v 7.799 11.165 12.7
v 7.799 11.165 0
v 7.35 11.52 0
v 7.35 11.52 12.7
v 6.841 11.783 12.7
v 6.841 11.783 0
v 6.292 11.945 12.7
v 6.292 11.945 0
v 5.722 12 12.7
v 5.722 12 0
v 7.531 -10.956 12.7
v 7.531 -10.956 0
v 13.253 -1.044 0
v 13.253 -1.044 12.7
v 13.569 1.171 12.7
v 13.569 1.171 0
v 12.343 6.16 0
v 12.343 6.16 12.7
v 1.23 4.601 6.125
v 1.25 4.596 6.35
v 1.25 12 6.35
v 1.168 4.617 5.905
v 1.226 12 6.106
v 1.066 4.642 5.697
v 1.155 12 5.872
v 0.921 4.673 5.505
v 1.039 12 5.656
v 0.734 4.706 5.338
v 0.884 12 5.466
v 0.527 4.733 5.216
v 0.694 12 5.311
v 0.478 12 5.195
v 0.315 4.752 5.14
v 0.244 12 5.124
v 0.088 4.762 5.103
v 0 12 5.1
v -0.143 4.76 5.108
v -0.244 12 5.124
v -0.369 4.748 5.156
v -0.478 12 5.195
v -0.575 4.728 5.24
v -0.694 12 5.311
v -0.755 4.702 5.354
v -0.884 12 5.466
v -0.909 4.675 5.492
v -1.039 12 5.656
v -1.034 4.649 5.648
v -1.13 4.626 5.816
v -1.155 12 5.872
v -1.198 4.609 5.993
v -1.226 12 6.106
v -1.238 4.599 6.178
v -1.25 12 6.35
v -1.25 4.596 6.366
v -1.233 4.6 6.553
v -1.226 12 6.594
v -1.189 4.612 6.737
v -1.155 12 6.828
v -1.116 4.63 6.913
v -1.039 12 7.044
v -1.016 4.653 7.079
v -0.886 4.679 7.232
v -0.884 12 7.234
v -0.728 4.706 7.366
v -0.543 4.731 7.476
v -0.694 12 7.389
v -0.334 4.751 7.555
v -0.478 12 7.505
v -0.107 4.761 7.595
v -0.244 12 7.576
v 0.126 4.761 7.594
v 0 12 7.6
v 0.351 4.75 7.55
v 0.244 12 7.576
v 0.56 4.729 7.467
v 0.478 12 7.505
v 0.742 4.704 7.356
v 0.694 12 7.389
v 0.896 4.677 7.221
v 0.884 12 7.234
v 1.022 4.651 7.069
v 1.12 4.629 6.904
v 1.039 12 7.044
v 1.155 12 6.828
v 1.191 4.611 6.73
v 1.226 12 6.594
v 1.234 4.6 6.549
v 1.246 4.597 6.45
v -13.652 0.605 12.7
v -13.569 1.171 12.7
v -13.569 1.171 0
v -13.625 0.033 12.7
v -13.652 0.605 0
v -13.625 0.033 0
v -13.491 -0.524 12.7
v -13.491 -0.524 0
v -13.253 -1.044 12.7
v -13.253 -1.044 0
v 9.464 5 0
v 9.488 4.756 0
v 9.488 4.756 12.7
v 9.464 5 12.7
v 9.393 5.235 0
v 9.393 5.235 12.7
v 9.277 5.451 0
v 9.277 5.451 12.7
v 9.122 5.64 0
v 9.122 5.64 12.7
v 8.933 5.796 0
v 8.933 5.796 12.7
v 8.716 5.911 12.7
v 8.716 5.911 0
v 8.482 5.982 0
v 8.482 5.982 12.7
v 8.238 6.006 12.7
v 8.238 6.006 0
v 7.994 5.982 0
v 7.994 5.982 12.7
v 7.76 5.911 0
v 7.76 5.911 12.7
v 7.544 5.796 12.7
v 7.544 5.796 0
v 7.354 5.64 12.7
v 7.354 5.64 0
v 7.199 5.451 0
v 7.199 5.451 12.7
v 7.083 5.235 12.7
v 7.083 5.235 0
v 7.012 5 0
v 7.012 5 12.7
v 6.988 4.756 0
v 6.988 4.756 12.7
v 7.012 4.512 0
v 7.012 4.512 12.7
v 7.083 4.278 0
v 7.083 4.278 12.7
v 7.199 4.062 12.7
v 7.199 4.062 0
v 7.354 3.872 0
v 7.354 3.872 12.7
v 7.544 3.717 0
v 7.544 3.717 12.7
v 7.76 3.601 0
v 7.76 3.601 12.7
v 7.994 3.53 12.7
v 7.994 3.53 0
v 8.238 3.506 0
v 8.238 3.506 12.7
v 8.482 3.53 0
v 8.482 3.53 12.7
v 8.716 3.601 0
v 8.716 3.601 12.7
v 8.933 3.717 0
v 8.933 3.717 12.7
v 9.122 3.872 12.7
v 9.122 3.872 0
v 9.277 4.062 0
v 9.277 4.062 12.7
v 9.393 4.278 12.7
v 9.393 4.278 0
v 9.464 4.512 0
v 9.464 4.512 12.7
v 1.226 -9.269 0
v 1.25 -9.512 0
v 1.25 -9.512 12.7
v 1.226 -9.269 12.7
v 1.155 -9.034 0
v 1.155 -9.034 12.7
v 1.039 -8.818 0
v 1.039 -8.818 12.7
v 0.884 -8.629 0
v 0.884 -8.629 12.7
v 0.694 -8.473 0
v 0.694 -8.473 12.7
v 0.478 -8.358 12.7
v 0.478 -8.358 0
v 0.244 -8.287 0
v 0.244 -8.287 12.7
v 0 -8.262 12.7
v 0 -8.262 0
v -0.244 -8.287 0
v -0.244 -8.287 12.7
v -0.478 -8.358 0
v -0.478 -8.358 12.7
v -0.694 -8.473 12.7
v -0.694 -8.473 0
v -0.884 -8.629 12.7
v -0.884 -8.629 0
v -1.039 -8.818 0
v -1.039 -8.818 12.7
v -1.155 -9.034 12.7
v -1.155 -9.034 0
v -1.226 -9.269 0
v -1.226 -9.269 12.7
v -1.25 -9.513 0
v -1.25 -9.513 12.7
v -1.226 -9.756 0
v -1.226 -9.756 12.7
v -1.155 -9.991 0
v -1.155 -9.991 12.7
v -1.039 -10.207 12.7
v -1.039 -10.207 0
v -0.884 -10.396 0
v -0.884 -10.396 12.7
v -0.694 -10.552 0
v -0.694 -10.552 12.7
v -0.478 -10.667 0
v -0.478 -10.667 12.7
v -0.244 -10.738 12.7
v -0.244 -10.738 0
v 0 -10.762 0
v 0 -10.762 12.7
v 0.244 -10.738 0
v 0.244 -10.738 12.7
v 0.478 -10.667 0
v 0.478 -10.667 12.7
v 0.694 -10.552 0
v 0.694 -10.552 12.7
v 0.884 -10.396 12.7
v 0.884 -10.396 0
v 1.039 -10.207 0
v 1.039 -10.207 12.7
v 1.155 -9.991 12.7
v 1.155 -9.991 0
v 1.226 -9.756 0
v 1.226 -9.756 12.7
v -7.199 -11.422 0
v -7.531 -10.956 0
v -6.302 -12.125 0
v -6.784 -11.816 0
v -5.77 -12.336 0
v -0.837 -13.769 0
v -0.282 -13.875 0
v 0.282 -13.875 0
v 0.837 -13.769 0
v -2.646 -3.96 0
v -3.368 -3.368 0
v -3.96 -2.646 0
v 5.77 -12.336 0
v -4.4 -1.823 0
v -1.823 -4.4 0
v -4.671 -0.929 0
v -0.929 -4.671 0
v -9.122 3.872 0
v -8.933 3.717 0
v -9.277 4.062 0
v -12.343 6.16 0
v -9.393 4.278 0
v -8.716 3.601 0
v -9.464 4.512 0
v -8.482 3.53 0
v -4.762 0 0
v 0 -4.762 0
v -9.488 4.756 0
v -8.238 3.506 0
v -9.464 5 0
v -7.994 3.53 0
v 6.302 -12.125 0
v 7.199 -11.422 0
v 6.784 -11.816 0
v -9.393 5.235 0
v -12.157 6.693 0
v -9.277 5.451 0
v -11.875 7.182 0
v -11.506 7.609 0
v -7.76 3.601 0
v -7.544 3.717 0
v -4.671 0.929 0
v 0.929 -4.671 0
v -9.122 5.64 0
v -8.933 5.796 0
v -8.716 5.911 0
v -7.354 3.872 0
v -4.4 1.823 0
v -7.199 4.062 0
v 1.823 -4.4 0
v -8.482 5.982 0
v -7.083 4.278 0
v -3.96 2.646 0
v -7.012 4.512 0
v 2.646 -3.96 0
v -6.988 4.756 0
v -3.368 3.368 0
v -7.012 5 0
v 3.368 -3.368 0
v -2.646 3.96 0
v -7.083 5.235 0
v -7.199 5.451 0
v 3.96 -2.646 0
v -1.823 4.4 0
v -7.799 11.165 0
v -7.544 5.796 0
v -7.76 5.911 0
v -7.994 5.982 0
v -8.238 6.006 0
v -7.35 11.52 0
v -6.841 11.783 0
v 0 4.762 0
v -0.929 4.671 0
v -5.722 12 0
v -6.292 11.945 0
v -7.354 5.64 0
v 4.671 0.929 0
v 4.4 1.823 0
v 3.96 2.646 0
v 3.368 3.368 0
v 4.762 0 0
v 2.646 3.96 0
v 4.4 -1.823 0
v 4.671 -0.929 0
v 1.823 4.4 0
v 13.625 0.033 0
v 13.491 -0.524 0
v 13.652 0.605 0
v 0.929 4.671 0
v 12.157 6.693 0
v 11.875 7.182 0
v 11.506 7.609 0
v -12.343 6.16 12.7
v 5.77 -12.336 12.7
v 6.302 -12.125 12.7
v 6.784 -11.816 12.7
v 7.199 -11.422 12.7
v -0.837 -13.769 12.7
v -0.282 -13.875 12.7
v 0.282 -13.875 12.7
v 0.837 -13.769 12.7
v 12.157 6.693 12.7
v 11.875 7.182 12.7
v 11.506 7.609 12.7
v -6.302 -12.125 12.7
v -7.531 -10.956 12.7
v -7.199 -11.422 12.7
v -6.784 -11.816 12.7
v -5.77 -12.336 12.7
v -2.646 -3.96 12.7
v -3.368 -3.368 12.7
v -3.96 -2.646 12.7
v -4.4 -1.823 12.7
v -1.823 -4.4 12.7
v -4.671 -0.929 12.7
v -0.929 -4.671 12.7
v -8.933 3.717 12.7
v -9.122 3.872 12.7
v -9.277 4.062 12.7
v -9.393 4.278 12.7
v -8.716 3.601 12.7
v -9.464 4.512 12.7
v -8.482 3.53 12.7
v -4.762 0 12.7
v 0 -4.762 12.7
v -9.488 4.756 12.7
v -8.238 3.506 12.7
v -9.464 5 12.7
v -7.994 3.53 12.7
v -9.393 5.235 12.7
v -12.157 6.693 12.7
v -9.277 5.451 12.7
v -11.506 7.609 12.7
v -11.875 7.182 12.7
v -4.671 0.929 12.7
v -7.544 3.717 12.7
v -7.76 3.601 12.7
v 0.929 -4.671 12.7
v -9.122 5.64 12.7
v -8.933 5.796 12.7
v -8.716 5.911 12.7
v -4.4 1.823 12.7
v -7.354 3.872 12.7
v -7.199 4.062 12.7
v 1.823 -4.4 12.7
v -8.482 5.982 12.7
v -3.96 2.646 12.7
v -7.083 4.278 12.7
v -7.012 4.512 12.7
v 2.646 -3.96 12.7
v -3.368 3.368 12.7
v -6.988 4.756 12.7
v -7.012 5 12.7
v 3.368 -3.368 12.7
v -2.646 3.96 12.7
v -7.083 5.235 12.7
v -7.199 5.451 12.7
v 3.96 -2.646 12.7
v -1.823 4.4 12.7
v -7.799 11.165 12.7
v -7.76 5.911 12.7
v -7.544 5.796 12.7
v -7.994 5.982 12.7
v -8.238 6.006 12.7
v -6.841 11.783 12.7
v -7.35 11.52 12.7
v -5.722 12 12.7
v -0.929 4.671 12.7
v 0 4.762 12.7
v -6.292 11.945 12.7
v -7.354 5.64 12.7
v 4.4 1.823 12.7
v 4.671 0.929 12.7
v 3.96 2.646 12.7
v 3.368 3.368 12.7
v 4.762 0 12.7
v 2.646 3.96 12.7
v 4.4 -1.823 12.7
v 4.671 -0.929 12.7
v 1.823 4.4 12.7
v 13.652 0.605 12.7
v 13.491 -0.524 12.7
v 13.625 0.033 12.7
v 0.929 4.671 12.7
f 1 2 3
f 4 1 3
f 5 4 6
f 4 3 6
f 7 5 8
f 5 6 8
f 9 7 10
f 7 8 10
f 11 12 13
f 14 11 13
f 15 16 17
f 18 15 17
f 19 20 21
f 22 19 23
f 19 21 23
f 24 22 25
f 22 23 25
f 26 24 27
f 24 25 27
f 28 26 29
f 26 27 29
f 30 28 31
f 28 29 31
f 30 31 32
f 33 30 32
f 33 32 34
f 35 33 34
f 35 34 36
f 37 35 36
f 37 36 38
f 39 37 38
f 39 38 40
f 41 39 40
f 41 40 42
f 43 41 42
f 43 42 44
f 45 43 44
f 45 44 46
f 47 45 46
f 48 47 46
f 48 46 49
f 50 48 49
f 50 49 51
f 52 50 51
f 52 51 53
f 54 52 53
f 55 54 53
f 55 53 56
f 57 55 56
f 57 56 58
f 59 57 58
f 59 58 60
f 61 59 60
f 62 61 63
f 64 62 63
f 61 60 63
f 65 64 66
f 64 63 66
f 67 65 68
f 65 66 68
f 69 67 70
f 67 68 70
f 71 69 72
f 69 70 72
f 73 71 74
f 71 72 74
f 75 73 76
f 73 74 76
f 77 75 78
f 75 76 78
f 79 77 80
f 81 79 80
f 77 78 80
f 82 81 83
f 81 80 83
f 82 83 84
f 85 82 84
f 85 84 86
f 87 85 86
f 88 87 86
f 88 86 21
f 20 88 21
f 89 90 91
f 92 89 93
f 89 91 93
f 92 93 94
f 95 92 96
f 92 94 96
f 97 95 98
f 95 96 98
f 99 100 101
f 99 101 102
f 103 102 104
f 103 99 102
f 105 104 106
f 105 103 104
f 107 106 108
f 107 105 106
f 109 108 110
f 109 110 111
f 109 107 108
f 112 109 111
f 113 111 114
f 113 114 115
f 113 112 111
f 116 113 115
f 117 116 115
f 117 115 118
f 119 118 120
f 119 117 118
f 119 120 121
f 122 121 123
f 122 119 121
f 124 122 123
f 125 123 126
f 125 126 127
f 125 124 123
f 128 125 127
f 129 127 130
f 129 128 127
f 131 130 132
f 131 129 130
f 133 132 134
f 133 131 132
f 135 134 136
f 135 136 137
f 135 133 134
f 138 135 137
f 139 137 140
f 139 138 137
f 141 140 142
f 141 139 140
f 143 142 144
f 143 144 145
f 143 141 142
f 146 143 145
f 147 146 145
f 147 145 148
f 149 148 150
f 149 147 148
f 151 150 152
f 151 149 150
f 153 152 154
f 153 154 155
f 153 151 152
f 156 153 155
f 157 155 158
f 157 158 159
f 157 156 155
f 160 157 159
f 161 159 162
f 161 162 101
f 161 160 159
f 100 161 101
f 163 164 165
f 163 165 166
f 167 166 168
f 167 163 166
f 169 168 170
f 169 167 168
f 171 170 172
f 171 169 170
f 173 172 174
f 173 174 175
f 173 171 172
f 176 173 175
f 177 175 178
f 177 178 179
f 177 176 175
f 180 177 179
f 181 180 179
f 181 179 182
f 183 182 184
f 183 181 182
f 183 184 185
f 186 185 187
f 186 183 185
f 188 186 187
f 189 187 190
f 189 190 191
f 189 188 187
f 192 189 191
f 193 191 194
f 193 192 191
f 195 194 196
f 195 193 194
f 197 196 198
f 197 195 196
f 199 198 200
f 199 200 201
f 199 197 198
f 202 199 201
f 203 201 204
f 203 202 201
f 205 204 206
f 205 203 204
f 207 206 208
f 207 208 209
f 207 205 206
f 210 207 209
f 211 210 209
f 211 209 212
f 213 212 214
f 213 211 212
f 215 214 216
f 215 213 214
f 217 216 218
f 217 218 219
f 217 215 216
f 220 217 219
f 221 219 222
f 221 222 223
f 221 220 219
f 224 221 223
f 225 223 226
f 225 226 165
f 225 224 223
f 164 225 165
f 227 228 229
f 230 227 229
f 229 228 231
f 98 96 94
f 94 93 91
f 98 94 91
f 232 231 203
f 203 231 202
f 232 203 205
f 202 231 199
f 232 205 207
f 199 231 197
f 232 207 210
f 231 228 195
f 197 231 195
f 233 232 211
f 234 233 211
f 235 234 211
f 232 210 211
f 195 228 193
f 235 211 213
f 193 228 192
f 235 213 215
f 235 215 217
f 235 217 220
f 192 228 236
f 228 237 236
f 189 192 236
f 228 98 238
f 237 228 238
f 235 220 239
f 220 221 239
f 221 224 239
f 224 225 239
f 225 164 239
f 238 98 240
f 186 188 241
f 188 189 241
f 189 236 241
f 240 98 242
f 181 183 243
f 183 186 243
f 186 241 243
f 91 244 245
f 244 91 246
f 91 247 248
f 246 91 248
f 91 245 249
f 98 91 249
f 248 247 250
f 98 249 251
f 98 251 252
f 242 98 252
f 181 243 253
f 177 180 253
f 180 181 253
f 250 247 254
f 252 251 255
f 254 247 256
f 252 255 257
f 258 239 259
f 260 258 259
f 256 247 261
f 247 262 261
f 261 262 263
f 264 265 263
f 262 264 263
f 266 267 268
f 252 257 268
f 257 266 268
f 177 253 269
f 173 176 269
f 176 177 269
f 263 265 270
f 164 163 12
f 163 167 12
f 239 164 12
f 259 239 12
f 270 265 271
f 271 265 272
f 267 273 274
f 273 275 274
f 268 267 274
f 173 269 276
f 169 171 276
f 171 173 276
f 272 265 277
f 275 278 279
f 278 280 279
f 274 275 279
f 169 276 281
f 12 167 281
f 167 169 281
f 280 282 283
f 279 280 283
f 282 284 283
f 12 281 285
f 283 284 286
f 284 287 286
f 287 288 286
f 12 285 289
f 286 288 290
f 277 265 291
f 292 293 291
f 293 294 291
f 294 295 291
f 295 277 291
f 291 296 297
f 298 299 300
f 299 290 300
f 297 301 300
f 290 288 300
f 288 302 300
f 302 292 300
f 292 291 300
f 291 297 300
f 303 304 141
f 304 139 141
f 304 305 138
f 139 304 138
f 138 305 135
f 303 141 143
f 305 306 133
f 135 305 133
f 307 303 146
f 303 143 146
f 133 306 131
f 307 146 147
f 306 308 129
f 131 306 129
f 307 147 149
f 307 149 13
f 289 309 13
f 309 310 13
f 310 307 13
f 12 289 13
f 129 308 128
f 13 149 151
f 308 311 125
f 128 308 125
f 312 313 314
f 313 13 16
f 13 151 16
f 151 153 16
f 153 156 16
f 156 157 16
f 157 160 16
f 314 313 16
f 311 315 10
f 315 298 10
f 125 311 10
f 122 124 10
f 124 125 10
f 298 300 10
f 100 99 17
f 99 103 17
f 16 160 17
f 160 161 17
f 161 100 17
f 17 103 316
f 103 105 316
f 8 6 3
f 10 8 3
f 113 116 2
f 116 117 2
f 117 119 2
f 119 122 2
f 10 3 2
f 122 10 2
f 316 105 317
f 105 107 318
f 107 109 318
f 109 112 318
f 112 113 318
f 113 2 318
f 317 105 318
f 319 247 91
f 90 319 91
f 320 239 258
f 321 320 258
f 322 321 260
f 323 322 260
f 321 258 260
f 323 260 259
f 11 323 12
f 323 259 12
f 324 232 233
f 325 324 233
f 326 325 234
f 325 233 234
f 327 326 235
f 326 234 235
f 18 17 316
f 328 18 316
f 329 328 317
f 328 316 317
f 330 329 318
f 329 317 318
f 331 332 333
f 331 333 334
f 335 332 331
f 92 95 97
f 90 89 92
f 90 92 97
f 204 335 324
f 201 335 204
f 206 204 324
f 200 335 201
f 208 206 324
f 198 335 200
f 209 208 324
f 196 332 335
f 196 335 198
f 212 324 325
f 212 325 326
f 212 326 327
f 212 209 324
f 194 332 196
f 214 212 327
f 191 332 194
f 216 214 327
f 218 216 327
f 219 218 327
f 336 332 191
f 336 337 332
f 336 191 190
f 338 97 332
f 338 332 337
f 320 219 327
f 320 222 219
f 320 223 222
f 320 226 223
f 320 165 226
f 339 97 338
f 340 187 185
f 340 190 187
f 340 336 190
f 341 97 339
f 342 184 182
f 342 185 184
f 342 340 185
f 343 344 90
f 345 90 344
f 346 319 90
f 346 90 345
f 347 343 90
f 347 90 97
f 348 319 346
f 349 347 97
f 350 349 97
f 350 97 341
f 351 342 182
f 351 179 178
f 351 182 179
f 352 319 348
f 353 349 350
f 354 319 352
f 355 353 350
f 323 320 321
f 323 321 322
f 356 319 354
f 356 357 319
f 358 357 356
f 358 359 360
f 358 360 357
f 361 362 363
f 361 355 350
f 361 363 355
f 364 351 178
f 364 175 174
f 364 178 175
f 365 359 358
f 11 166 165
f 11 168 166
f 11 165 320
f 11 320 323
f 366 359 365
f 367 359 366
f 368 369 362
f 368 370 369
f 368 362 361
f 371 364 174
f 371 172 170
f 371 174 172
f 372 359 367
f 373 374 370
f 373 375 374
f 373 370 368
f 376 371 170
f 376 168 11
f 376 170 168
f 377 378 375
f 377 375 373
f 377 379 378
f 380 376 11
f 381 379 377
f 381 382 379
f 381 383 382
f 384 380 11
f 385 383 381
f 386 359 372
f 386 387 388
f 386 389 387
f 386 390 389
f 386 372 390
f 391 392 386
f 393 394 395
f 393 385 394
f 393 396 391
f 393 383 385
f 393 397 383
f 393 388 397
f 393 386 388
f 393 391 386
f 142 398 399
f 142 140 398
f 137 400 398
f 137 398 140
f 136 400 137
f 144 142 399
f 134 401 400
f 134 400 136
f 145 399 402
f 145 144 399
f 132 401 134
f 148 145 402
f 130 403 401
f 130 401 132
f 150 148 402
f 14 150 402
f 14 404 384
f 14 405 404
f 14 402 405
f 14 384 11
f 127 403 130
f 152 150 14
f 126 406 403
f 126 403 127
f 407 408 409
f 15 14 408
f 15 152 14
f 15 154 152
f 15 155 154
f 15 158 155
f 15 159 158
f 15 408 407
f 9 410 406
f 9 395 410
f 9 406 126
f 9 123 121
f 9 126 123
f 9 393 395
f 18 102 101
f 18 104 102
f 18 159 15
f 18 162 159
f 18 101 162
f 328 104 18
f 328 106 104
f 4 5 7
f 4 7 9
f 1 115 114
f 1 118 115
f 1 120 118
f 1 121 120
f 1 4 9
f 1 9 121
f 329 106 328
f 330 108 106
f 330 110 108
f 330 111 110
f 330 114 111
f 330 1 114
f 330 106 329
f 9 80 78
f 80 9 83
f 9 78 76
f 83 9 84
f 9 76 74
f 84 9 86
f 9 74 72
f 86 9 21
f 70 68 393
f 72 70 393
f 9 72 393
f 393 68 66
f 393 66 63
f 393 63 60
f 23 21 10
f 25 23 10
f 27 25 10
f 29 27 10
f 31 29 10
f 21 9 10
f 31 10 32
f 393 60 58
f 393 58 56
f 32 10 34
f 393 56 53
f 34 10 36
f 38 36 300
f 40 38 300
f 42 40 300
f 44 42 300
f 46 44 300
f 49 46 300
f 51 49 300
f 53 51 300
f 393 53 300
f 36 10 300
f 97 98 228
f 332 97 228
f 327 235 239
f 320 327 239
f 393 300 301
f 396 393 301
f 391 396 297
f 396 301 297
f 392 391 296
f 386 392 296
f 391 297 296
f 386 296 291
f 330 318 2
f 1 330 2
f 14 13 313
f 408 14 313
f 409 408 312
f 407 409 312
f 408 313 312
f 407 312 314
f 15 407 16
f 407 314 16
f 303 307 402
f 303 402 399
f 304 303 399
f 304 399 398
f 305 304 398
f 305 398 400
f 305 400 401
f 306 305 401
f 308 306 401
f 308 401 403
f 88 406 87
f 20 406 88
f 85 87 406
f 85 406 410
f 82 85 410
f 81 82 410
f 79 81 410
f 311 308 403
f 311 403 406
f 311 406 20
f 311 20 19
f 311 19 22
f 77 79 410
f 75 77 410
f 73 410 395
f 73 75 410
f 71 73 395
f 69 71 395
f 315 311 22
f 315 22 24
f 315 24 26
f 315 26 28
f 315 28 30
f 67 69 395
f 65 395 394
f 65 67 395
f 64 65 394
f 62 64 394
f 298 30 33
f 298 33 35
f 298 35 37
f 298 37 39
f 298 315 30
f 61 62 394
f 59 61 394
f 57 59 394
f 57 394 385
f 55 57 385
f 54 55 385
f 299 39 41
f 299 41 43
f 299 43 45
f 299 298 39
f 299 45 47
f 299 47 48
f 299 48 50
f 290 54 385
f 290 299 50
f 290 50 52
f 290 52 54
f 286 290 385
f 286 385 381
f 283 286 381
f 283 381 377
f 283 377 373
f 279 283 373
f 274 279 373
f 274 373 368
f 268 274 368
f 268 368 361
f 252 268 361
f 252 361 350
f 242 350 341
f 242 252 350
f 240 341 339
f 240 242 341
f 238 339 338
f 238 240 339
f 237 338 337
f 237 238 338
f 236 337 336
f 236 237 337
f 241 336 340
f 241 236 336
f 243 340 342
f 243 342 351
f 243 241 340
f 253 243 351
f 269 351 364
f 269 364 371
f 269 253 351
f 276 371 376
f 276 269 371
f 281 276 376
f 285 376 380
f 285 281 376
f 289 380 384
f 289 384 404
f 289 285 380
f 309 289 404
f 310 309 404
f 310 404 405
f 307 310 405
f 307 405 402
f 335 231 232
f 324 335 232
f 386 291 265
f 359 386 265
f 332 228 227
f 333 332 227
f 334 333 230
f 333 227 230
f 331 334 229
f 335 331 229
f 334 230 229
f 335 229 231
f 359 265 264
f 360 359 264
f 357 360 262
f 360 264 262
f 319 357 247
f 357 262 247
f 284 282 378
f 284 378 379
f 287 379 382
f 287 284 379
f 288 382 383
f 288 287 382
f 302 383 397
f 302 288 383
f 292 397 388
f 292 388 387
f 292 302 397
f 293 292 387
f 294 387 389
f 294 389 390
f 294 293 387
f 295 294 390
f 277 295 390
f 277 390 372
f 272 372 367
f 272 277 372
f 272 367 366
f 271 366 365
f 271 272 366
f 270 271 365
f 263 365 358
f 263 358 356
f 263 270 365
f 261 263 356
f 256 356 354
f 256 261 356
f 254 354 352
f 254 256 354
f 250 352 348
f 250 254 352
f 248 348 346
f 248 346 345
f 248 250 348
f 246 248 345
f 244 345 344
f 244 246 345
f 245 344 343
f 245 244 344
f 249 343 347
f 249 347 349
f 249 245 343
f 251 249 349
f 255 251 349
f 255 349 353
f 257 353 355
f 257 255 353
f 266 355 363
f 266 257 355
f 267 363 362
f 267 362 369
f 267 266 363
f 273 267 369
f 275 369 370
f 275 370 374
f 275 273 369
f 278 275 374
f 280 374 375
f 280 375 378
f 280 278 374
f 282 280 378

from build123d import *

# Parameters (mm, degrees)
SKETCH1_R           = 4.7625
SKETCH1_R_2         = 1.25
BOSS_EXTRUDE1_DEPTH = 12.7
CUT_EXTRUDE1_REACH  = 27.888
SKETCH2_R           = 1.25


with BuildPart() as part:
    # Sketch1 → Boss-Extrude1 (new body)
    with BuildSketch(Plane.XY):
        with BuildLine():
            Line((-13.253372163, -1.044486042), (-7.531237528, -10.955513958))
            ThreePointArc((-7.531237528, -10.955513958), (-6.784217233, -11.816359568), (-5.770008435, -12.336431676))
            Line((-5.770008435, -12.336431676), (-0.836847118, -13.76941319))
            ThreePointArc((-0.836847118, -13.76941319), (0, -13.888495471), (0.836847118, -13.76941319))
            Line((0.836847118, -13.76941319), (5.770008435, -12.336431676))
            ThreePointArc((5.770008435, -12.336431676), (6.784217233, -11.816359568), (7.531237528, -10.955513958))
            Line((7.531237528, -10.955513958), (13.253372163, -1.044486042))
            ThreePointArc((13.253372163, -1.044486042), (13.625376182, 0.032875315), (13.568667441, 1.171241953))
            Line((13.568667441, 1.171241953), (12.343085176, 6.159975731))
            ThreePointArc((12.343085176, 6.159975731), (12.027789898, 6.944247736), (11.506238058, 7.609437458))
            Line((11.506238058, 7.609437458), (7.798659006, 11.165189723))
            ThreePointArc((7.798659006, 11.165189723), (6.841158949, 11.783484253), (5.722134635, 12))
            Line((5.722134635, 12), (-5.722134635, 12))
            ThreePointArc((-5.722134635, 12), (-6.841158949, 11.783484253), (-7.798659006, 11.165189723))
            Line((-7.798659006, 11.165189723), (-11.506238058, 7.609437458))
            ThreePointArc((-11.506238058, 7.609437458), (-12.027789898, 6.944247736), (-12.343085176, 6.159975731))
            Line((-12.343085176, 6.159975731), (-13.568667441, 1.171241953))
            ThreePointArc((-13.568667441, 1.171241953), (-13.625376182, 0.032875315), (-13.253372163, -1.044486042))
        make_face()
        Circle(SKETCH1_R, mode=Mode.SUBTRACT)
        with Locations((-8.238066653, 4.75625)):
            Circle(SKETCH1_R_2, mode=Mode.SUBTRACT)
        with Locations((8.238066653, 4.75625)):
            Circle(SKETCH1_R_2, mode=Mode.SUBTRACT)
        with Locations((0, -9.5125)):
            Circle(SKETCH1_R_2, mode=Mode.SUBTRACT)
    extrude(amount=BOSS_EXTRUDE1_DEPTH)

    # Sketch2 → Cut-Extrude1 (cut, up to next)
    with BuildSketch(Plane(origin=(0, 12, 0), x_dir=(1, 0, 0), z_dir=(0, 1, 0)), mode=Mode.PRIVATE) as cut_extrude1_sk1:
        with Locations((0, -6.35)):
            Circle(SKETCH2_R)
    cut_extrude1_tool1 = extrude(cut_extrude1_sk1.sketch, amount=-CUT_EXTRUDE1_REACH, mode=Mode.PRIVATE) & part.part
    add(cut_extrude1_tool1.solids().sort_by_distance((0, 12, 6.35))[0], mode=Mode.SUBTRACT)


solid = part.part
